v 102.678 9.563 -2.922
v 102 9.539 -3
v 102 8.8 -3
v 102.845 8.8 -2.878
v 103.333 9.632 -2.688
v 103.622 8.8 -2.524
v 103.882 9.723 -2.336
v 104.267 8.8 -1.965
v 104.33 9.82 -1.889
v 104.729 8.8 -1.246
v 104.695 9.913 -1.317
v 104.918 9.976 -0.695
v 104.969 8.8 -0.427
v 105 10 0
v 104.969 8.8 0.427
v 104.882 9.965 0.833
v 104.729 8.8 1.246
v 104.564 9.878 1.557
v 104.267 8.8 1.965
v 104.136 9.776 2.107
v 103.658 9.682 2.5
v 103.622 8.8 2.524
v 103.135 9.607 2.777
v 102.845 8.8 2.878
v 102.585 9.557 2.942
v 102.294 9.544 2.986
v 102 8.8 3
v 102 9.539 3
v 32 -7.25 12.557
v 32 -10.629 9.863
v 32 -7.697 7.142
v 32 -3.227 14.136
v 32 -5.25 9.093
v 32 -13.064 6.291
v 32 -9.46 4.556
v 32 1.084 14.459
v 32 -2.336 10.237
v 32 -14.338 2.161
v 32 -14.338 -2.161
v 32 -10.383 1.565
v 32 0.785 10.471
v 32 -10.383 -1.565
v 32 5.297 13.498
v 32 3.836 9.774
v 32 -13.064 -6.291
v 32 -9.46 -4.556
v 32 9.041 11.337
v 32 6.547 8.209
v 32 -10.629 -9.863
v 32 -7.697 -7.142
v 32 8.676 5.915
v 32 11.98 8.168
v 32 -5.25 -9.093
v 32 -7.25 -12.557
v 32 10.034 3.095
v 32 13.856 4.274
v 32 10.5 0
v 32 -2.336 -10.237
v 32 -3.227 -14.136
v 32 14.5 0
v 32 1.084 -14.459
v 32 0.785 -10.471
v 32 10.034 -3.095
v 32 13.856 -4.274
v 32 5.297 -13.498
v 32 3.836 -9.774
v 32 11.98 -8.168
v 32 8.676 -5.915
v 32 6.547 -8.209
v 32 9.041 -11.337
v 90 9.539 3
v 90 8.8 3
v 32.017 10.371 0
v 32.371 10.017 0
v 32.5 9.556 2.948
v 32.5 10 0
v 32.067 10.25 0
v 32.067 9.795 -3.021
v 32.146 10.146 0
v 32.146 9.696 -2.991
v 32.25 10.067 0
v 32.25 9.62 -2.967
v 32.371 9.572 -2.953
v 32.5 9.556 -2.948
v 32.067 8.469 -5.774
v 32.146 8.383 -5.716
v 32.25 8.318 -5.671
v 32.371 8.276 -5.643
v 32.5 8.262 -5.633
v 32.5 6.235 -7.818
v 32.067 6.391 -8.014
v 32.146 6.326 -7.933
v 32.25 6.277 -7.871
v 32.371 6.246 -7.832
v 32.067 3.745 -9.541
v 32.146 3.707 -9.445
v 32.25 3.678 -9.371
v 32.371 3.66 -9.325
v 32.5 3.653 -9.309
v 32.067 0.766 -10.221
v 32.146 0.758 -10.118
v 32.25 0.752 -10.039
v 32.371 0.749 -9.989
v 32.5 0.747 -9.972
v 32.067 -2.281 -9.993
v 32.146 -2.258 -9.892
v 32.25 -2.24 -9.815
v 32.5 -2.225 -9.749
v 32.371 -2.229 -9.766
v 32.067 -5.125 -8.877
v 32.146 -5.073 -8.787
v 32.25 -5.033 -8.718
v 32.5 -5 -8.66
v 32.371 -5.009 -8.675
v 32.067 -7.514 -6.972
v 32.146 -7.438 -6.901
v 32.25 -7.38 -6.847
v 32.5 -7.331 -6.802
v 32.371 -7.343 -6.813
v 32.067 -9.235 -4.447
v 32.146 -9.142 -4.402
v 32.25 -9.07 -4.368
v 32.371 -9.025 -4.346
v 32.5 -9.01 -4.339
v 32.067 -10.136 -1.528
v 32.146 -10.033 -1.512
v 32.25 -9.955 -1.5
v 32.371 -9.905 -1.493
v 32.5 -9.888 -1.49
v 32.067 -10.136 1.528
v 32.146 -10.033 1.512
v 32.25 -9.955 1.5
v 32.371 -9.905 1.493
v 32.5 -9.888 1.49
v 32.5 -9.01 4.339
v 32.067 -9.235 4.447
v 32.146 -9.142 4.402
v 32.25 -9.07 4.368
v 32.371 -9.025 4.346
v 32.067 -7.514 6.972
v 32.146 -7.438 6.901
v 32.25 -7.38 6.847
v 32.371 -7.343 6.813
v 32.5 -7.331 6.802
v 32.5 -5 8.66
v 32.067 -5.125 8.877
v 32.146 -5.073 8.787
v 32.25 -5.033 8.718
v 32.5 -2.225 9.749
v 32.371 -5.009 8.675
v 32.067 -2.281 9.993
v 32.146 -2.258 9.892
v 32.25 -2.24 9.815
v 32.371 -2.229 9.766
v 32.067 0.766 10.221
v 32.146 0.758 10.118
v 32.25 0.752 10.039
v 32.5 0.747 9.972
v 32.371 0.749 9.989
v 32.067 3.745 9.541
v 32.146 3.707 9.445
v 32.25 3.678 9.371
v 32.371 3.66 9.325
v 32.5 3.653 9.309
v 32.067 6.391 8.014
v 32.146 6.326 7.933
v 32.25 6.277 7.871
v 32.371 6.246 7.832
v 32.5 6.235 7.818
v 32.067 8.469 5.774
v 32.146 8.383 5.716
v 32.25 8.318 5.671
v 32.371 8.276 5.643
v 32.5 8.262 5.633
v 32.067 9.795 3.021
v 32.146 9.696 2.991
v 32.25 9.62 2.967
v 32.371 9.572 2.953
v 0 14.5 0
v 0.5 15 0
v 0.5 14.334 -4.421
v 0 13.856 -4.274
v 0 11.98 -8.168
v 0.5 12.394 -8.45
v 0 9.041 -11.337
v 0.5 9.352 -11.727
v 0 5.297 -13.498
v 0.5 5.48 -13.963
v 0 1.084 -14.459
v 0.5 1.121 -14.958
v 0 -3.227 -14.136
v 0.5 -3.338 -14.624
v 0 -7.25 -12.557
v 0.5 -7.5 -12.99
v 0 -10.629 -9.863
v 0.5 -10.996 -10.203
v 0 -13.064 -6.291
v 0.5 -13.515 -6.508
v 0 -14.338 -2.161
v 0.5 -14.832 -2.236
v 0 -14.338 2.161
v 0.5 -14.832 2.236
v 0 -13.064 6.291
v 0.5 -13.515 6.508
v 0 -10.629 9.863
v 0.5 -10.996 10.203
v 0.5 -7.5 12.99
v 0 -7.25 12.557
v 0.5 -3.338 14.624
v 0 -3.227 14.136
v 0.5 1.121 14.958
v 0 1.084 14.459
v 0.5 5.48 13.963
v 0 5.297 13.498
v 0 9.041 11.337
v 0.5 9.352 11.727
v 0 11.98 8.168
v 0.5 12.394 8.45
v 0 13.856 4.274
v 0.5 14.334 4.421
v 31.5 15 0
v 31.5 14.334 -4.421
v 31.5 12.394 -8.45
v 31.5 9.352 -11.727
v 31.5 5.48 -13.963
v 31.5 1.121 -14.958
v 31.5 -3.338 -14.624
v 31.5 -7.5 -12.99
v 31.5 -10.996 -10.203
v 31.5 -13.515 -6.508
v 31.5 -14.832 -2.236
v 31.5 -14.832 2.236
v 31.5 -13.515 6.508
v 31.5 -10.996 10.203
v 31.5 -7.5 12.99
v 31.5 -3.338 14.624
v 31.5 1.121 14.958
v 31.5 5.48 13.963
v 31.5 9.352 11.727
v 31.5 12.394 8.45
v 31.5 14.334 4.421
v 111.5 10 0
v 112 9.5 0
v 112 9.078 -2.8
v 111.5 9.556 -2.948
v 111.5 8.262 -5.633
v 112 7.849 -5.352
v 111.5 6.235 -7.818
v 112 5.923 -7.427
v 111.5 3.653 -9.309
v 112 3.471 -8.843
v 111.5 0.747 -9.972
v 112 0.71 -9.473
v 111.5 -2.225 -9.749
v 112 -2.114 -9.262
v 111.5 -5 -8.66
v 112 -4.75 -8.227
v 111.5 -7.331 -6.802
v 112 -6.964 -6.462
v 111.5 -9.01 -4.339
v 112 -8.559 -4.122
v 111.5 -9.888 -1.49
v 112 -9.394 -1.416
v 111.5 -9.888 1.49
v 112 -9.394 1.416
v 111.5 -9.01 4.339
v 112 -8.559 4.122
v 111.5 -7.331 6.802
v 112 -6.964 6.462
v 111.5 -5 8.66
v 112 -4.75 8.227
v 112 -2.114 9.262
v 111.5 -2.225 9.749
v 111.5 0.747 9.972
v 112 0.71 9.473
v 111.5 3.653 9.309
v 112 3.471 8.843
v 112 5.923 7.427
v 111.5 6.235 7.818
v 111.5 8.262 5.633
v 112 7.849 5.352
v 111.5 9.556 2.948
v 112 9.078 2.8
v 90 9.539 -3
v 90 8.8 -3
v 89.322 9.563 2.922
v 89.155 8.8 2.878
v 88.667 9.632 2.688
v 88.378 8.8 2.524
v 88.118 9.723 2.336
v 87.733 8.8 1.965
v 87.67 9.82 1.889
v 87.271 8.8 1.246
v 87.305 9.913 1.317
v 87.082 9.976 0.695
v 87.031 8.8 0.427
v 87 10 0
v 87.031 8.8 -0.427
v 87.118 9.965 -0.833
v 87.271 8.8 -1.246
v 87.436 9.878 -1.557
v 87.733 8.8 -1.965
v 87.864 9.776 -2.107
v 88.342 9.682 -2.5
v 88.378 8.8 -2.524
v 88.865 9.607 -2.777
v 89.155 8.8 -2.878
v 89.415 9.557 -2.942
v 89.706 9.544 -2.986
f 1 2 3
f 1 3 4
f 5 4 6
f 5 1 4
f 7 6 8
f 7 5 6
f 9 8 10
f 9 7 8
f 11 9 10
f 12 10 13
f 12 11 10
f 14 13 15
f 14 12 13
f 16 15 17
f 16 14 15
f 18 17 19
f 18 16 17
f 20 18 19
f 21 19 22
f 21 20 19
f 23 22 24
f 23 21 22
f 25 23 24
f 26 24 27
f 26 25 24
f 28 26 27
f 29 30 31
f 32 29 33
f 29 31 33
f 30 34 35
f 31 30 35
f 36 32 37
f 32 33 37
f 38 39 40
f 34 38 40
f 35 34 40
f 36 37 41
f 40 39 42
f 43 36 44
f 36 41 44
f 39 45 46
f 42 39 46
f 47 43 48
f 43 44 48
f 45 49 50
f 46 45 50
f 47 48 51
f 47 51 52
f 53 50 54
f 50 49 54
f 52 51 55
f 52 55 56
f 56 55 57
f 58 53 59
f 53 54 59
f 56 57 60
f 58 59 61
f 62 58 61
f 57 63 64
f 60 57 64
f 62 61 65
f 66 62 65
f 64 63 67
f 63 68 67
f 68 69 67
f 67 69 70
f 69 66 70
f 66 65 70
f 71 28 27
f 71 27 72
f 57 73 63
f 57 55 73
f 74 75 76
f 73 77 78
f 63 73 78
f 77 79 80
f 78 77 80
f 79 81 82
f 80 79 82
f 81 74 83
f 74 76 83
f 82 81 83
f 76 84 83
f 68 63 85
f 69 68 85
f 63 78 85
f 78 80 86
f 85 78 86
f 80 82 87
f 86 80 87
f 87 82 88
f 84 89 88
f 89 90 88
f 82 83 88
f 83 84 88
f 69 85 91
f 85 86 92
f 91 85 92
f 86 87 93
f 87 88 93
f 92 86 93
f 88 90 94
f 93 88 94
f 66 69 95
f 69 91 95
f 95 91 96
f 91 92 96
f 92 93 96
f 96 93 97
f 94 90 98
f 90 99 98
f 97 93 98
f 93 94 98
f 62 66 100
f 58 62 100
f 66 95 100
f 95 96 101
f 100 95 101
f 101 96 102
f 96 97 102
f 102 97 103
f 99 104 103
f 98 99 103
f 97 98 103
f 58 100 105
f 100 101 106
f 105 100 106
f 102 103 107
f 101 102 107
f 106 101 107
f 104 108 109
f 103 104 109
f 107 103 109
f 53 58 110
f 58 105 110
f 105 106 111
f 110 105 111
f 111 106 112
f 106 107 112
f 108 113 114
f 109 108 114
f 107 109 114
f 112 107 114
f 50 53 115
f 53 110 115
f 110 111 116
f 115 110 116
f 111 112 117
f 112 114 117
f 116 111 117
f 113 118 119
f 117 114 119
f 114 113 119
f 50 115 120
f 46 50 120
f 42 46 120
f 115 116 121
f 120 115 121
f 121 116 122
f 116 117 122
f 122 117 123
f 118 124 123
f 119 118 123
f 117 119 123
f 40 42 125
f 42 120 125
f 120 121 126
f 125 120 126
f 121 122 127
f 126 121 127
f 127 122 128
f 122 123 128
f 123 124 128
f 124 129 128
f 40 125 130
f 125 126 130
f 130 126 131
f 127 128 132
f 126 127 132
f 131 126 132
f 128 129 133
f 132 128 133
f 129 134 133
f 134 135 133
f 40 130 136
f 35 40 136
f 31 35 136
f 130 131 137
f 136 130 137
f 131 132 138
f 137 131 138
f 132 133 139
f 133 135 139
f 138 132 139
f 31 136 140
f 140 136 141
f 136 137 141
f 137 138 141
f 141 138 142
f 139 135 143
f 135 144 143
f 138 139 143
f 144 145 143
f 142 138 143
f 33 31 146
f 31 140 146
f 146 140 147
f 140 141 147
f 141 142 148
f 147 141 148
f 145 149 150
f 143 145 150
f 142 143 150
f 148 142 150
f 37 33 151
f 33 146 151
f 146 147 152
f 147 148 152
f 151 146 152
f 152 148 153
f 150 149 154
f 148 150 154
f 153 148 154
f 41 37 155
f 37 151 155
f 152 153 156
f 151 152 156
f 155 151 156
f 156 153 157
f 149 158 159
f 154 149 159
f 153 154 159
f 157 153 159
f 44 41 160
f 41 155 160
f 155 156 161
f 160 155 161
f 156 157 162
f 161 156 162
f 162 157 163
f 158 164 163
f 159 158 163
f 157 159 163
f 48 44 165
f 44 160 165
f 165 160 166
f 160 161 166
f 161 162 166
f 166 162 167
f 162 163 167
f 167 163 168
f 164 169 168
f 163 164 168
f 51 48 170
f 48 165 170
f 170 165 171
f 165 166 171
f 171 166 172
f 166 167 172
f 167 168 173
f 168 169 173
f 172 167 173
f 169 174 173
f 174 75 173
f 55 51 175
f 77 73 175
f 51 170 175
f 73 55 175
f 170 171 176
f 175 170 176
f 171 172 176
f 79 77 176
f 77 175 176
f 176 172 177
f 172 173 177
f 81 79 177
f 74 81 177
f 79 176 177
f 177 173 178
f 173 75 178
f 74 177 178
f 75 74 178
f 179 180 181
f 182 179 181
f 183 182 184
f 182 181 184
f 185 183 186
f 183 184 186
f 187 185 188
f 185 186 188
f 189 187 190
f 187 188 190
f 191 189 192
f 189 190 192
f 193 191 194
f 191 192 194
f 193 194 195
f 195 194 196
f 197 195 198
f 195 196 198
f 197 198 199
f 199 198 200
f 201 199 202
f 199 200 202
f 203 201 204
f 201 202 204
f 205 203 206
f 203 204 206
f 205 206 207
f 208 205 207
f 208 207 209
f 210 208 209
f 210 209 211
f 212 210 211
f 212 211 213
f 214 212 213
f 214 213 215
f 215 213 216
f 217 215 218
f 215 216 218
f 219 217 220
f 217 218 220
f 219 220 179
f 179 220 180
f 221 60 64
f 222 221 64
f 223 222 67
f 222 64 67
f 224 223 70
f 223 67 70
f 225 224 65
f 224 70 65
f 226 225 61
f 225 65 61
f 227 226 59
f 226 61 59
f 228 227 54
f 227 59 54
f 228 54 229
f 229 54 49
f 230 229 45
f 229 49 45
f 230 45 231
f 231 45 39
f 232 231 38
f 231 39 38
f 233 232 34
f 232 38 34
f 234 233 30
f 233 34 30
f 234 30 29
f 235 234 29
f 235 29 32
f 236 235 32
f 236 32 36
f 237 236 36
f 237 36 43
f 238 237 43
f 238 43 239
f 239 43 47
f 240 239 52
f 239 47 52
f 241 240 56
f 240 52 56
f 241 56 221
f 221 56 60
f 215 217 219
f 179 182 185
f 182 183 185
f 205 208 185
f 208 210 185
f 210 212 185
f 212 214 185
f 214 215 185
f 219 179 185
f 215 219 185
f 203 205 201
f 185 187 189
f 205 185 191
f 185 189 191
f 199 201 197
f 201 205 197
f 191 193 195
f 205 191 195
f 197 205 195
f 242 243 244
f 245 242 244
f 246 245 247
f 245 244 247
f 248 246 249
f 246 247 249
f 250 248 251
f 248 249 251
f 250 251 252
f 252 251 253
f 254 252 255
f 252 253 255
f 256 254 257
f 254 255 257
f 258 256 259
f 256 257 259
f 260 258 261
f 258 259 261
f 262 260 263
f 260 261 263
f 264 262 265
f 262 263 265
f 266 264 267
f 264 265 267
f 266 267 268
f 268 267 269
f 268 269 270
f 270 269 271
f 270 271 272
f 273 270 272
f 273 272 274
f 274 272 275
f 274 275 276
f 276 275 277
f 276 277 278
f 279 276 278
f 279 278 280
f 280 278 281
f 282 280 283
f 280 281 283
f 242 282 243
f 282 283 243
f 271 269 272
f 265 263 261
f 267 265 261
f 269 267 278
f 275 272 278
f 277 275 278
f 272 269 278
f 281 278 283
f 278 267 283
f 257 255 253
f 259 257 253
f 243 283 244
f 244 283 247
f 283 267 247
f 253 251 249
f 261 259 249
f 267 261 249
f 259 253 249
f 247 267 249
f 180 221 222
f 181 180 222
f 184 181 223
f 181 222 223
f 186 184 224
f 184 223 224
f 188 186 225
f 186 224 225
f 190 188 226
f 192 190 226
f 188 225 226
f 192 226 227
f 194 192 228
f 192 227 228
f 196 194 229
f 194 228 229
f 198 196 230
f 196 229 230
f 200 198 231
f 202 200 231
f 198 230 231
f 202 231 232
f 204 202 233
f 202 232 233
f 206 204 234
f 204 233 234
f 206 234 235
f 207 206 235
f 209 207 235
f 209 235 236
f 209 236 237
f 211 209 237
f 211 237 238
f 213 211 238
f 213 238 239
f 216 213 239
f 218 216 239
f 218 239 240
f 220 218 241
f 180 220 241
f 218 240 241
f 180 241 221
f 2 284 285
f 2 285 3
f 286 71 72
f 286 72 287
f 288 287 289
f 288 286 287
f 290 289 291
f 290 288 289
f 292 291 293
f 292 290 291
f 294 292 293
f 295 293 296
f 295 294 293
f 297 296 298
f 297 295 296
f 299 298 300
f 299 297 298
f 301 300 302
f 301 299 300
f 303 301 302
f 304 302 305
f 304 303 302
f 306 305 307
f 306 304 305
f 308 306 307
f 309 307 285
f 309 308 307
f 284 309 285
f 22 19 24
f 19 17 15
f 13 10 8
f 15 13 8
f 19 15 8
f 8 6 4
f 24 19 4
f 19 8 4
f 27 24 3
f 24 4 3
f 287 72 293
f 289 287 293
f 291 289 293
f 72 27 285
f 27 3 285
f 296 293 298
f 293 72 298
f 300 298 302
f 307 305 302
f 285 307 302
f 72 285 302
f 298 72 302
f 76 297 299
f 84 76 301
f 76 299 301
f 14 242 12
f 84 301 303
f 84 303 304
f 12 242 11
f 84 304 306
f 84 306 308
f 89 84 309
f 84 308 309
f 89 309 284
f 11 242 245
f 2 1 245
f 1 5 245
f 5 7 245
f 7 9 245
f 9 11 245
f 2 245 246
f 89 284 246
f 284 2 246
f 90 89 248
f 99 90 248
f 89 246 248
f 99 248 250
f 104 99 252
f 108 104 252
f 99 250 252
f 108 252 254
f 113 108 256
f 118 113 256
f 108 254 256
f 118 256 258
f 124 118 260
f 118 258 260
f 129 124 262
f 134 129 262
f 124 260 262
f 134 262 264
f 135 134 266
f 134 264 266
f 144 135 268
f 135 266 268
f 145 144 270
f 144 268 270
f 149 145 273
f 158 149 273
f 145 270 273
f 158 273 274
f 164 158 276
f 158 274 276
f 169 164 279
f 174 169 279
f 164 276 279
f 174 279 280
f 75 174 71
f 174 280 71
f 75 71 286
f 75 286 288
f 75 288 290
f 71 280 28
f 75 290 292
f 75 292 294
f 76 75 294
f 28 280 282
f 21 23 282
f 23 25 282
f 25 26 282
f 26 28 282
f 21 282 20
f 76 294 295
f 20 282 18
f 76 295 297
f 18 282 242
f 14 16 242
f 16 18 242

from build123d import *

# Parameters (mm, degrees)
CHAMFER_1_SIZE      = 0.5
FILLET_1_R          = 0.5
CUT_EXTRUDE_1_DEPTH = 1.2


with BuildPart() as part:
    # Эскиз1 → Повернуть1 (revolve)
    with BuildSketch(Plane.XY):
        Polygon((0, 0), (0, 15), (32, 15), (32, 10), (112, 10), (112, 0), align=None)
    revolve(axis=Axis((112, 0, 0), (-1, 0, 0)))

    # Фаска1
    chamfer_1_edges = [part.edges().sort_by_distance(p)[0] for p in [
        (112, -10, 0),
        (32, -15, 0),
        (0, -15, 0),
    ]]
    chamfer(chamfer_1_edges, length=CHAMFER_1_SIZE)

    # Скругление1
    fillet_1_edges = [part.edges().sort_by_distance(p)[0] for p in [
        (32, -10, 0),
    ]]
    fillet(fillet_1_edges, radius=FILLET_1_R)

    # Эскиз2 → Вырез-Вытянуть1 (cut)
    with BuildSketch(Plane(origin=(0, 10, 0), x_dir=(1, 0, 0), z_dir=(0, 1, 0))):
        with BuildLine():
            Line((90, 3), (102, 3))
            ThreePointArc((102, 3), (105, 0), (102, -3))
            Line((102, -3), (90, -3))
            ThreePointArc((90, -3), (87, 0), (90, 3))
        make_face()
    extrude(amount=-CUT_EXTRUDE_1_DEPTH, mode=Mode.SUBTRACT)


solid = part.part
